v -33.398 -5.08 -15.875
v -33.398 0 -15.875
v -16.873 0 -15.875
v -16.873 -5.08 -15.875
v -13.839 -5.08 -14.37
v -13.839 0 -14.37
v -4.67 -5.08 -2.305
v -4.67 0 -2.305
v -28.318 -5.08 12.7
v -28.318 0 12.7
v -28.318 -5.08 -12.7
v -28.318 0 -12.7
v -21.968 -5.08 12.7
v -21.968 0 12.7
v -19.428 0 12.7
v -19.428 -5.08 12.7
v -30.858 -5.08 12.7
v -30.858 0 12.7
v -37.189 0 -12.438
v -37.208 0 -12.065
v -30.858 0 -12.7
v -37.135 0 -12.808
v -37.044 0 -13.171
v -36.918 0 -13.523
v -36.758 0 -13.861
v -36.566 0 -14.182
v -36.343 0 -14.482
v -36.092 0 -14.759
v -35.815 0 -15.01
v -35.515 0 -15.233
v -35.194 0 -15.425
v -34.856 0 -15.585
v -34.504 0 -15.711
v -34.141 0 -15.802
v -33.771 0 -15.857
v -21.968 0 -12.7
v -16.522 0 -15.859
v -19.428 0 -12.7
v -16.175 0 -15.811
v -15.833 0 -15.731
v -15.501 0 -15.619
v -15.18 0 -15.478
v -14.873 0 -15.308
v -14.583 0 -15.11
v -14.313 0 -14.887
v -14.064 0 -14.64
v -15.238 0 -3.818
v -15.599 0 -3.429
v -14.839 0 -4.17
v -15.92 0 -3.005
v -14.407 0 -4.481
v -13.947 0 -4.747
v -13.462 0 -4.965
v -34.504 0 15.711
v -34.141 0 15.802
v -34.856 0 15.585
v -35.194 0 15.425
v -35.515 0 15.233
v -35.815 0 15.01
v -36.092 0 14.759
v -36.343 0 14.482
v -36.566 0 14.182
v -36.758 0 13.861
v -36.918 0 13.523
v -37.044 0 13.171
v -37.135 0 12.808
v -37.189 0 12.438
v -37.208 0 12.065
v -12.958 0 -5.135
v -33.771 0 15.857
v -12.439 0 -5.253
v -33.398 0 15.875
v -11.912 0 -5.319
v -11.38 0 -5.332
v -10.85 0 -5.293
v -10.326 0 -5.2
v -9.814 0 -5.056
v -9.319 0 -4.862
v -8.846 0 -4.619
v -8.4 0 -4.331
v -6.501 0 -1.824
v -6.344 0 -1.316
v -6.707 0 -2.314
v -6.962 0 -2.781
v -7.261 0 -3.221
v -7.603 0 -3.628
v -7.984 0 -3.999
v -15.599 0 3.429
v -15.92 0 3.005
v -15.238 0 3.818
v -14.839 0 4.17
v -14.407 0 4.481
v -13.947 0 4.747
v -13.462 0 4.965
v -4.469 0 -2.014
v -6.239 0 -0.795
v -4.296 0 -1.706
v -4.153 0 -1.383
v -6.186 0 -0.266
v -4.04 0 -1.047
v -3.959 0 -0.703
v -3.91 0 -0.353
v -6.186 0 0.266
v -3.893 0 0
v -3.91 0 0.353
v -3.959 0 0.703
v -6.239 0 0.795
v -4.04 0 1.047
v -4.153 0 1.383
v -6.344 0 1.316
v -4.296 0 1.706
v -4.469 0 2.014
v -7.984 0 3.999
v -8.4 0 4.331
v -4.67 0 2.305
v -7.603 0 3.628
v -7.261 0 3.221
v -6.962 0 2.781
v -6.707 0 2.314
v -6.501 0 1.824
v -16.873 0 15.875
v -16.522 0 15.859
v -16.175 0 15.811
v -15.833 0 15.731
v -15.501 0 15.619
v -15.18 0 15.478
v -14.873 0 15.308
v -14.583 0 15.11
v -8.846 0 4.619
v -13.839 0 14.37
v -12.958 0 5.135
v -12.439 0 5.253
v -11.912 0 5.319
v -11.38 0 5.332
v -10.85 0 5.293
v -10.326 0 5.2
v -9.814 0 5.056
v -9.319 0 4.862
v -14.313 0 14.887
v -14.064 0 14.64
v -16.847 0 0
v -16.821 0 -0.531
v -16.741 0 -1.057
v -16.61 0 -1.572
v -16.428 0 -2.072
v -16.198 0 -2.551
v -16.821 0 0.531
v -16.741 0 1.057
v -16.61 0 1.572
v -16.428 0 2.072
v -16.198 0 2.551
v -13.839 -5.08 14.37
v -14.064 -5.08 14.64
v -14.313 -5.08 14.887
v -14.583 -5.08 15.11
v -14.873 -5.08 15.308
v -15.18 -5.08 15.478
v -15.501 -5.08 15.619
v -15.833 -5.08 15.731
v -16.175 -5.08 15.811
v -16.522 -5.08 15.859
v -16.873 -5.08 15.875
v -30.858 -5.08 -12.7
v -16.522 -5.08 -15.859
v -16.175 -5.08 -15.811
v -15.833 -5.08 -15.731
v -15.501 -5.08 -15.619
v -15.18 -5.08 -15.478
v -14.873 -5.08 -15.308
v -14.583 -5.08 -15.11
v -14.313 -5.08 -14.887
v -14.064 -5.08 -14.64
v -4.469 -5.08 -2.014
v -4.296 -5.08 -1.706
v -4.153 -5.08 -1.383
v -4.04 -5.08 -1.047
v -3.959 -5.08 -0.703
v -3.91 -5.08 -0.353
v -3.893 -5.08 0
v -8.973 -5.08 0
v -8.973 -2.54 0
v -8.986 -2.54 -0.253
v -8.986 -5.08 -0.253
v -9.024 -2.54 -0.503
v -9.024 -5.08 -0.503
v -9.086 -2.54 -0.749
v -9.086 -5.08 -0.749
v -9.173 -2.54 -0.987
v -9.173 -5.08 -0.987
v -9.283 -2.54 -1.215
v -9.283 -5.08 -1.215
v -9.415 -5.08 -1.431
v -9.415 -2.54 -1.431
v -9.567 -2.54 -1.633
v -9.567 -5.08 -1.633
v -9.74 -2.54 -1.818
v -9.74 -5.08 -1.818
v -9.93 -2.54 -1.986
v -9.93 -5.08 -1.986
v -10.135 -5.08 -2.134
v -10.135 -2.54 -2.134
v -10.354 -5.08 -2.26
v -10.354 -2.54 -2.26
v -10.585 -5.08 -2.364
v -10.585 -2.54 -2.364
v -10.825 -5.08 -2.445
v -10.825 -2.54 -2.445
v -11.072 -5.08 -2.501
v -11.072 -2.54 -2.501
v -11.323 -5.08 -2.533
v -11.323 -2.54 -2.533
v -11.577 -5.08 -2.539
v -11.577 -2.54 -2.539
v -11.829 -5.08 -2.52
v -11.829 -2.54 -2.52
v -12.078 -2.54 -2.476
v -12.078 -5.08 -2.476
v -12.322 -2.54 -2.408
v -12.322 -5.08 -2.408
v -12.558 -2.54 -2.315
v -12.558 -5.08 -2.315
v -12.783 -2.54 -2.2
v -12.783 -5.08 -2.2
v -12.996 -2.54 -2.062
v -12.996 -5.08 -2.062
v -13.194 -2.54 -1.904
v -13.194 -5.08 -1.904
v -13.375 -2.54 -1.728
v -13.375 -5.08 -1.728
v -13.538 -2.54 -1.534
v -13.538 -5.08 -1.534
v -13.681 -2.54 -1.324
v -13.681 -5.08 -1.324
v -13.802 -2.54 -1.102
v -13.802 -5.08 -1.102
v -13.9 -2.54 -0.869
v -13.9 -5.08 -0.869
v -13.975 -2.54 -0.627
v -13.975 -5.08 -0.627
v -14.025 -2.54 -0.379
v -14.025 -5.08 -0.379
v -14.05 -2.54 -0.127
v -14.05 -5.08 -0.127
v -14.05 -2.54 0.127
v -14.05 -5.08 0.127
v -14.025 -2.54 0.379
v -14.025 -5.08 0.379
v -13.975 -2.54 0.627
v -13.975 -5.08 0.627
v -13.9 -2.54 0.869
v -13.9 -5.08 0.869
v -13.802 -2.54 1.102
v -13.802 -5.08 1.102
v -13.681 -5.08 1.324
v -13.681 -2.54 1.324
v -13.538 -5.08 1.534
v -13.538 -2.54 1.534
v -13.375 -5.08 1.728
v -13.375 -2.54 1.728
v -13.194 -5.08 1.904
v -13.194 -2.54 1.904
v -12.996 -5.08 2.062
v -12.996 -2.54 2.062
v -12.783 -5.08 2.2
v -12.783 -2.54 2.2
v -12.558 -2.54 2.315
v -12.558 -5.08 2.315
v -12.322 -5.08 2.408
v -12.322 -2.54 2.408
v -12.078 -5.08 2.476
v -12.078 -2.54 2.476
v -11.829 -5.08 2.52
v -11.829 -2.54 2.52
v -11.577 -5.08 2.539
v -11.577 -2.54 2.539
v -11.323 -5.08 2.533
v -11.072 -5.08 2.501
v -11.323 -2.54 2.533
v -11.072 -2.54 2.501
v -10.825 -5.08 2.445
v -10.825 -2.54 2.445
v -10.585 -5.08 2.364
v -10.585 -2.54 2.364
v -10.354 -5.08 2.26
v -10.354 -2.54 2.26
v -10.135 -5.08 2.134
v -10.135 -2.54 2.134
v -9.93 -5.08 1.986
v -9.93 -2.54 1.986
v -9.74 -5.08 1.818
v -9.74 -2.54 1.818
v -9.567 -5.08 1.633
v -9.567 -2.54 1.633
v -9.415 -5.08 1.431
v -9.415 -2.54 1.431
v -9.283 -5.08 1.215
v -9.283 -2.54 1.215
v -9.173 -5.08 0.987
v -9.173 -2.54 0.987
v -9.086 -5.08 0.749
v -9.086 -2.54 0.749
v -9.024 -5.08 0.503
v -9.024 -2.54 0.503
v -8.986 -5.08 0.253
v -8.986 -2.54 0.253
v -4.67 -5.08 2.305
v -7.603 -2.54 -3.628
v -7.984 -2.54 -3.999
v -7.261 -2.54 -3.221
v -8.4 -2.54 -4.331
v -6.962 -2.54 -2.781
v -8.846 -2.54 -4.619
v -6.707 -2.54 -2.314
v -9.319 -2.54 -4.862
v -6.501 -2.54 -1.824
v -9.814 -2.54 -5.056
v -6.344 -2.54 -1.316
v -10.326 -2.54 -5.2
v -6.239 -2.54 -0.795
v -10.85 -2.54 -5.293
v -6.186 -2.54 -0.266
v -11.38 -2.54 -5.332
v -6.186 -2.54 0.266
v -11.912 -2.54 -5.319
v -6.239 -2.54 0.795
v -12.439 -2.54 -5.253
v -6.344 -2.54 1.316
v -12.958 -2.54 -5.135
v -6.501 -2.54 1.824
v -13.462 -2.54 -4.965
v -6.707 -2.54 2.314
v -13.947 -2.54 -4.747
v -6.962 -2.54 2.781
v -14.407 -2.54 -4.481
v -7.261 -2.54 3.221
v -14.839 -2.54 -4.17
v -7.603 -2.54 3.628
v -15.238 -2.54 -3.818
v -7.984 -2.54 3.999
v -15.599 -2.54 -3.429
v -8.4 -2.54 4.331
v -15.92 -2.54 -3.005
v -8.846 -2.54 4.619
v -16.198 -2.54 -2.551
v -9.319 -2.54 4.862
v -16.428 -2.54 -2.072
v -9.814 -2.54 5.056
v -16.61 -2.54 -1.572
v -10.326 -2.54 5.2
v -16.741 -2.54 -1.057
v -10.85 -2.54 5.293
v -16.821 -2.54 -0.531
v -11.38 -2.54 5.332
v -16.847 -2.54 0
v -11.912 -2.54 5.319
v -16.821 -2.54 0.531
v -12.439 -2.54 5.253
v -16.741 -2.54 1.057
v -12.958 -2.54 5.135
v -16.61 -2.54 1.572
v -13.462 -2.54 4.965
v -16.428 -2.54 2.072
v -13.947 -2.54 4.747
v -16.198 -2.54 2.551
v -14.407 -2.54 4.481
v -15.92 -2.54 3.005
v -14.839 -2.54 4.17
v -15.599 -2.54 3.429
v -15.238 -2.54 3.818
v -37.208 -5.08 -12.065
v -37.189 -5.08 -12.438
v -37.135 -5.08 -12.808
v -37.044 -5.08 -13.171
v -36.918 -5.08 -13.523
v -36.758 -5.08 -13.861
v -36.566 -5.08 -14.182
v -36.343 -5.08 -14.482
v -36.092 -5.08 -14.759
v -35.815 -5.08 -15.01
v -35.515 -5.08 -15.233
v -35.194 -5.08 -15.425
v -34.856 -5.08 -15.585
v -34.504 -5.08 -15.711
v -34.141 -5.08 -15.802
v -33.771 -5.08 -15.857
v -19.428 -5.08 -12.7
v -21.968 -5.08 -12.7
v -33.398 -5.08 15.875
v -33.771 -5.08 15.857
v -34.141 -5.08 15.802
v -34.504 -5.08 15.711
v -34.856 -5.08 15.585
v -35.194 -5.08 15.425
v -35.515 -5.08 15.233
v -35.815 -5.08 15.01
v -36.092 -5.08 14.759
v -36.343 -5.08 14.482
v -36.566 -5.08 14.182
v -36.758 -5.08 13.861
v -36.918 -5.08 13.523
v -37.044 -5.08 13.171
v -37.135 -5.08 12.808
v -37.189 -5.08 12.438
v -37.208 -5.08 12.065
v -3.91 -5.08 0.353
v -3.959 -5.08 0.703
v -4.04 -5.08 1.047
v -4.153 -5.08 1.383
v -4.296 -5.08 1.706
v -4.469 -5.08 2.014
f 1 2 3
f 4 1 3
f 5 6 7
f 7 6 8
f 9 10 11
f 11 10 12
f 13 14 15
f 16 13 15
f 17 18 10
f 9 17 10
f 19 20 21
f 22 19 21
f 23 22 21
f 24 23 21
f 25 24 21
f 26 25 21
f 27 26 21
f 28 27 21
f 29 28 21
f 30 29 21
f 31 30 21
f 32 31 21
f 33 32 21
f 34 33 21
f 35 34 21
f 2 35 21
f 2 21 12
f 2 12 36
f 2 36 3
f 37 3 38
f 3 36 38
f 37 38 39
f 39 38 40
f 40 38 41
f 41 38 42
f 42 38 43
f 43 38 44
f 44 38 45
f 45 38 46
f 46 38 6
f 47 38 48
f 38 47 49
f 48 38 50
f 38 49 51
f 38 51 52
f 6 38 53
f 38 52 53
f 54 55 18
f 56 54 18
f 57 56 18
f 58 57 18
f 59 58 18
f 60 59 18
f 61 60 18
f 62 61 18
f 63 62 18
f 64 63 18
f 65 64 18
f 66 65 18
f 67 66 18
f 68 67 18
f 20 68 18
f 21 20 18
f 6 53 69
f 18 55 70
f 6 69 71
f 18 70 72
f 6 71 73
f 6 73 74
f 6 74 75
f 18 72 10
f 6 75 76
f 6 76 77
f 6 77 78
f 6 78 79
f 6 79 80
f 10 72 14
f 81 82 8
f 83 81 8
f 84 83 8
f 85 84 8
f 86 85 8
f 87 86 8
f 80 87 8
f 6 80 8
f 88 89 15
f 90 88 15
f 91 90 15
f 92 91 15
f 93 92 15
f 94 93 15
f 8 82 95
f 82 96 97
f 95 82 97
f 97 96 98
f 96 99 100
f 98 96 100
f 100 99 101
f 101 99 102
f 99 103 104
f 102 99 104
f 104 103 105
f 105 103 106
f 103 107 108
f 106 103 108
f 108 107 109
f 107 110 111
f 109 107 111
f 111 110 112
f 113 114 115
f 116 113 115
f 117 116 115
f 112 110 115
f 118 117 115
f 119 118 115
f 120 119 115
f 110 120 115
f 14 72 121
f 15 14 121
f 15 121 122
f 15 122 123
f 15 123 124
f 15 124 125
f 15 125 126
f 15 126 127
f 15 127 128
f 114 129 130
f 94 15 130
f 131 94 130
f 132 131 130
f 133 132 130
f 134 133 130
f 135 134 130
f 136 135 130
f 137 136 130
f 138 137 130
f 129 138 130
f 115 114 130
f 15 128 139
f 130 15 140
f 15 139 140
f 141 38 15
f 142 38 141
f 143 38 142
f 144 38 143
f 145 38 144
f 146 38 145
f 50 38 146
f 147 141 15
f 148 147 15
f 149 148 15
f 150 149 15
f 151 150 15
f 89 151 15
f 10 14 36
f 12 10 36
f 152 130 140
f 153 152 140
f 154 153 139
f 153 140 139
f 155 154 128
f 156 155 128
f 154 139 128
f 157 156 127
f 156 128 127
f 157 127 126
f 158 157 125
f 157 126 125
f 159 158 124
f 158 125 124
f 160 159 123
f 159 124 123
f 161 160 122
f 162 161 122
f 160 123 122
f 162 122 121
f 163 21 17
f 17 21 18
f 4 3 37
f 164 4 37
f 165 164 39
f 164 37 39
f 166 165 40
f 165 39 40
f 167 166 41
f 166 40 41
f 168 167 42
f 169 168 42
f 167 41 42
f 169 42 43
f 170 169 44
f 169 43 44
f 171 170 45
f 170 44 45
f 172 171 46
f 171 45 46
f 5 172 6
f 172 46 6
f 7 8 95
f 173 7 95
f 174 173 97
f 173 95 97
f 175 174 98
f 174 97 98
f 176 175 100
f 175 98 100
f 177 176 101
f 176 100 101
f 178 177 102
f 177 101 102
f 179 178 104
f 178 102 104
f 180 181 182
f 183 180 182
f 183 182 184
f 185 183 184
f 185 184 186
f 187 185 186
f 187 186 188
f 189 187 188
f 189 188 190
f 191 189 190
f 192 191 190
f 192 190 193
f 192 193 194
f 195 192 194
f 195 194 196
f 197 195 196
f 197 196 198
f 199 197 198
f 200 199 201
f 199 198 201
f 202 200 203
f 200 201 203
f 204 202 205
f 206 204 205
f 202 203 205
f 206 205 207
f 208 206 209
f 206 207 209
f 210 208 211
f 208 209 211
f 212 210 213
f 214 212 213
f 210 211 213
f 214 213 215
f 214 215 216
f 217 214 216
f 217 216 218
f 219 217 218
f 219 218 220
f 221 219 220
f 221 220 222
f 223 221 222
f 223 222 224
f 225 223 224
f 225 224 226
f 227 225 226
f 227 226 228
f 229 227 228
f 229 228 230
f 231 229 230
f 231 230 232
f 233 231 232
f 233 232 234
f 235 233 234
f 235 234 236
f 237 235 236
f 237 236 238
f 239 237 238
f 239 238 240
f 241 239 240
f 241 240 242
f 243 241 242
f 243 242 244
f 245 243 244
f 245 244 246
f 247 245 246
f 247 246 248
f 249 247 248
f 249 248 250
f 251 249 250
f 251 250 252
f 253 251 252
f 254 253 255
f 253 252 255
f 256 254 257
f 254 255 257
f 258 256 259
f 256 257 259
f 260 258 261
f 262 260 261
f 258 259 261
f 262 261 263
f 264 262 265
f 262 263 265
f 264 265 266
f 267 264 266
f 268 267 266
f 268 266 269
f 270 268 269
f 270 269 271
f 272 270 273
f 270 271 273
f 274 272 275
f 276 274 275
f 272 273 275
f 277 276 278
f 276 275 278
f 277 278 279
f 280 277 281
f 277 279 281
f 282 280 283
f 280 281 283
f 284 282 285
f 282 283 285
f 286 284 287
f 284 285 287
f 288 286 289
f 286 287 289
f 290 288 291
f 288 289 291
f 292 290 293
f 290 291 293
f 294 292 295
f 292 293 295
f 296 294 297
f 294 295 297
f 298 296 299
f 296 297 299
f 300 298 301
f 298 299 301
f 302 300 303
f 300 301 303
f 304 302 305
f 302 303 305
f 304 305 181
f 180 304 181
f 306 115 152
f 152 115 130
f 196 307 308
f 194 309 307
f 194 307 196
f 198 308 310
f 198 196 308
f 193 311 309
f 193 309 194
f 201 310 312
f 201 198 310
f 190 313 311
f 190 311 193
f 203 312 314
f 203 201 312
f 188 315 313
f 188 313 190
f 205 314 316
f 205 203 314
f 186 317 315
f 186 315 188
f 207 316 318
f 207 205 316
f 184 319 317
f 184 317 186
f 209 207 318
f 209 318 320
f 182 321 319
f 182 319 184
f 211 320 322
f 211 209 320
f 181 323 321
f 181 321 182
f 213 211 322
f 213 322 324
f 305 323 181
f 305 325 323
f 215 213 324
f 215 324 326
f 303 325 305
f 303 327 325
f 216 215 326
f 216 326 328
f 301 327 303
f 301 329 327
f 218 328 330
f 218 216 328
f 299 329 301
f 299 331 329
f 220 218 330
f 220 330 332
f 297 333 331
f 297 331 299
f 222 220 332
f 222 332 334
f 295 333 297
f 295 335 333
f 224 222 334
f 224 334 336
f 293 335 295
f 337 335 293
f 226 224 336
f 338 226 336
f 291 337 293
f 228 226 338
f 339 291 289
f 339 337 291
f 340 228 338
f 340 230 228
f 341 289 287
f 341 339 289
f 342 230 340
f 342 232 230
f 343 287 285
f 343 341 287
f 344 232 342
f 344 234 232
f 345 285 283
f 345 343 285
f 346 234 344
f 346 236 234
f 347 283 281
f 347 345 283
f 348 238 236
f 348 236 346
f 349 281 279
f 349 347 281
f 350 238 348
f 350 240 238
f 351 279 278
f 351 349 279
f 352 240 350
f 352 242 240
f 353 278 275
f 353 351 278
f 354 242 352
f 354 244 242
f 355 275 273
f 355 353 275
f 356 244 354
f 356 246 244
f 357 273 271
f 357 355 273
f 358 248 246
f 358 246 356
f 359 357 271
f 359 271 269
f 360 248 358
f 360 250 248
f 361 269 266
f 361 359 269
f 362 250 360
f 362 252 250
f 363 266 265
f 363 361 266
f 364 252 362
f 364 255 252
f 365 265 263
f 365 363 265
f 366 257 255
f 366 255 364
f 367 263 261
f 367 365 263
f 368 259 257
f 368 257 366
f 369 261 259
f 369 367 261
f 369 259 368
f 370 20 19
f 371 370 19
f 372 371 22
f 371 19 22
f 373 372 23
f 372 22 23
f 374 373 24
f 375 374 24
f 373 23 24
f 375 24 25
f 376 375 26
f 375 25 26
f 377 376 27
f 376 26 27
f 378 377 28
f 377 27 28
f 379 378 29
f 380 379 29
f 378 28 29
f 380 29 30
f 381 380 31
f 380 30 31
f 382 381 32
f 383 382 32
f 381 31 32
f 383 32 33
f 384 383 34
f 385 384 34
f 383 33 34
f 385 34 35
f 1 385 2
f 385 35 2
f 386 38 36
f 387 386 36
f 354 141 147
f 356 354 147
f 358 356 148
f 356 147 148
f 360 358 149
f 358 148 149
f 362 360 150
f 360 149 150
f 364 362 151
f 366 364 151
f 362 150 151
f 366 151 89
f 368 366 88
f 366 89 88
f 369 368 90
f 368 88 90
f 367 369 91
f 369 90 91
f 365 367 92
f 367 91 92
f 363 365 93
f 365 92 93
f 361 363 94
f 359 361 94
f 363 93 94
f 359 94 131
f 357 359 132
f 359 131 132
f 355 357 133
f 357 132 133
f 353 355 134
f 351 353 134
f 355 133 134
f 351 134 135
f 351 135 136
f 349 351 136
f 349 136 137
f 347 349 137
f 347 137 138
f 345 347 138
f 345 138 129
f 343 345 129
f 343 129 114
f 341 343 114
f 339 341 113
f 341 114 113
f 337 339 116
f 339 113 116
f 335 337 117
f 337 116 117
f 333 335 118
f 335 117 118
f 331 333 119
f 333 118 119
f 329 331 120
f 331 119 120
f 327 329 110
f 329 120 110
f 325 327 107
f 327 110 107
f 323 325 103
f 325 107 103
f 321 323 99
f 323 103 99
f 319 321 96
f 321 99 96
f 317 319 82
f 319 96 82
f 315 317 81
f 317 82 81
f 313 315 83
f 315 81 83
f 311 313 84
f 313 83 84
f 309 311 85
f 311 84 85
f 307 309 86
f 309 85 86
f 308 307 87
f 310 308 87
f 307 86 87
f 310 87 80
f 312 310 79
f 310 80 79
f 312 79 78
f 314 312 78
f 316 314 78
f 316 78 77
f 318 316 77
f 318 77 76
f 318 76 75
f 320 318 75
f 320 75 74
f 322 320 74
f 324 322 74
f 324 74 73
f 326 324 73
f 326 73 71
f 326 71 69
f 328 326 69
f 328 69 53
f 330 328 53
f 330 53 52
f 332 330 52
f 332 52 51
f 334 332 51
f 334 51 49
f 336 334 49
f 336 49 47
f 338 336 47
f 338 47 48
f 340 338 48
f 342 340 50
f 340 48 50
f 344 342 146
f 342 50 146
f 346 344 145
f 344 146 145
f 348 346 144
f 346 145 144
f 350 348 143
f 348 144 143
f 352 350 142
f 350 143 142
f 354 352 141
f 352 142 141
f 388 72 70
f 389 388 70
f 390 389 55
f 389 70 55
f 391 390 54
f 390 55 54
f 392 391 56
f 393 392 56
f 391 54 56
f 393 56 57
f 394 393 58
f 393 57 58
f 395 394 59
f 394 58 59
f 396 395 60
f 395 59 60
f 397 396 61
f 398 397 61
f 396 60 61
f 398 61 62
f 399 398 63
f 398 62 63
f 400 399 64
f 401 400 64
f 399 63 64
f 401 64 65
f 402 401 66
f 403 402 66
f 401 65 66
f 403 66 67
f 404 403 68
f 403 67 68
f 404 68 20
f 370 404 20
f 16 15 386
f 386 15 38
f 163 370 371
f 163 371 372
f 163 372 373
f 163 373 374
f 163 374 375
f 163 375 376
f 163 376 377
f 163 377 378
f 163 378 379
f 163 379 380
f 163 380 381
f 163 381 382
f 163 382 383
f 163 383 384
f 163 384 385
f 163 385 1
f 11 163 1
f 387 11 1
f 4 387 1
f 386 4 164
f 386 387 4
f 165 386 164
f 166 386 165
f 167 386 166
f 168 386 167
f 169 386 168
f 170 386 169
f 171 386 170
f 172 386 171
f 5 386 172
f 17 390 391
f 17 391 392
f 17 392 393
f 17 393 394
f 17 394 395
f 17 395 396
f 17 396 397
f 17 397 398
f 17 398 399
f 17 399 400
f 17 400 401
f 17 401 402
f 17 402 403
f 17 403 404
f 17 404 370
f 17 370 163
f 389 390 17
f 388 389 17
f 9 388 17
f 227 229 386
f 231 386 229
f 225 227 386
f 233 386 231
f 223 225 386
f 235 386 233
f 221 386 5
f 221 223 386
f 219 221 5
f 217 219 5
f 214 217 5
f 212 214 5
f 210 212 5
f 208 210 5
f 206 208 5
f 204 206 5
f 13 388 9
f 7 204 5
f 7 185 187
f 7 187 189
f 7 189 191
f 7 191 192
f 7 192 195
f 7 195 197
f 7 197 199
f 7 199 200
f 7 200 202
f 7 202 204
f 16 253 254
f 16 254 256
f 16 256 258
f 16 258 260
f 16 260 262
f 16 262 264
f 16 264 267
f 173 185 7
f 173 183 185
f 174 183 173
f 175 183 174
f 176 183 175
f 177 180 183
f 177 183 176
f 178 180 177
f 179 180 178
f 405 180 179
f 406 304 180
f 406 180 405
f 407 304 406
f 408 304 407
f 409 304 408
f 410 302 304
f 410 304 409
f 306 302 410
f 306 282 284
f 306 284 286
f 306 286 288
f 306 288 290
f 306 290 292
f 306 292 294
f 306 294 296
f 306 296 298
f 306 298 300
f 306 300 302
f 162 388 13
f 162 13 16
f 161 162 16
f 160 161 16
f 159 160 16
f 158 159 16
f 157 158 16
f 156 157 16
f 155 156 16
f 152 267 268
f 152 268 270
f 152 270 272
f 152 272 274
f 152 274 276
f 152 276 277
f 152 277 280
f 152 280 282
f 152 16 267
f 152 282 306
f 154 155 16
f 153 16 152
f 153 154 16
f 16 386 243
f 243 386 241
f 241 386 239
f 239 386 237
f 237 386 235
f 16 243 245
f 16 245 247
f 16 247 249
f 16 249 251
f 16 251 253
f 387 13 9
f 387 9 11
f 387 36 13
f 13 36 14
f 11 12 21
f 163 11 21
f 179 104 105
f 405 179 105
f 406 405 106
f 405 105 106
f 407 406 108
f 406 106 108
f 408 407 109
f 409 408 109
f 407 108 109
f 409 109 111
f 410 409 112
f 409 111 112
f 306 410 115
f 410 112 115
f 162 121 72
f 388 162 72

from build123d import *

# Parameters (mm, degrees)
F1_DEPTH = 5.08
F2_R     = 5.334
F2_R_2   = 2.54
F3_DEPTH = 2.54


with BuildPart() as f1:
    # F0 (on Front) → F1 (new body)
    with BuildSketch(Plane.XZ):
        with BuildLine():
            ThreePointArc((-33.39778, 15.875), (-36.091856, 14.759077), (-37.20778, 12.065))
            Line((-37.20778, 12.065), (-37.20778, 0))
            Line((-37.20778, 0), (-30.85778, 0))
            Line((-30.85778, 0), (-30.85778, 12.7))
            Line((-30.85778, 12.7), (-28.31778, 12.7))
            Line((-28.31778, 12.7), (-28.31778, 0))
            Line((-28.31778, 0), (-21.96778, 0))
            Line((-21.96778, 0), (-21.96778, 12.7))
            Line((-21.96778, 12.7), (-19.42778, 12.7))
            Line((-19.42778, 12.7), (-19.42778, 0))
            Line((-19.42778, 0), (-14.053237, 0))
            ThreePointArc((-14.053237, 0), (-11.513237, 2.54), (-8.973237, 0))
            Line((-8.973237, 0), (-3.893237, 0))
            ThreePointArc((-3.893237, 0), (-4.092609, 1.216333), (-4.669859, 2.305367))
            Line((-4.669859, 2.305367), (-13.839259, 14.370367))
            ThreePointArc((-13.839259, 14.370367), (-15.179614, 15.478177), (-16.872637, 15.875))
            Line((-16.872637, 15.875), (-33.39778, 15.875))
        make_face()
        with BuildLine():
            Line((-30.85778, 0), (-37.20778, 0))
            Line((-37.20778, 0), (-37.20778, -12.065))
            ThreePointArc((-37.20778, -12.065), (-36.091856, -14.759077), (-33.39778, -15.875))
            Line((-33.39778, -15.875), (-16.872637, -15.875))
            ThreePointArc((-16.872637, -15.875), (-15.179614, -15.478177), (-13.839259, -14.370367))
            Line((-13.839259, -14.370367), (-4.669859, -2.305367))
            ThreePointArc((-4.669859, -2.305367), (-4.092609, -1.216333), (-3.893237, 0))
            Line((-3.893237, 0), (-8.973237, 0))
            ThreePointArc((-8.973237, 0), (-11.513237, -2.54), (-14.053237, 0))
            Line((-14.053237, 0), (-19.42778, 0))
            Line((-19.42778, 0), (-19.42778, -12.7))
            Line((-19.42778, -12.7), (-21.96778, -12.7))
            Line((-21.96778, -12.7), (-21.96778, 0))
            Line((-21.96778, 0), (-28.31778, 0))
            Line((-28.31778, 0), (-28.31778, -12.7))
            Line((-28.31778, -12.7), (-30.85778, -12.7))
            Line((-30.85778, -12.7), (-30.85778, 0))
        make_face()
    extrude(amount=F1_DEPTH)

    # F2 (on face) → F3 (cut)
    with BuildSketch(Plane(origin=(0, 0, 0), x_dir=(-1, 0, 0), z_dir=(0, 1, 0))):
        with Locations((11.513237, 0)):
            Circle(F2_R)
        with Locations((11.513237, 0)):
            Circle(F2_R_2, mode=Mode.SUBTRACT)
    extrude(amount=-F3_DEPTH, mode=Mode.SUBTRACT)


solid = f1.part
